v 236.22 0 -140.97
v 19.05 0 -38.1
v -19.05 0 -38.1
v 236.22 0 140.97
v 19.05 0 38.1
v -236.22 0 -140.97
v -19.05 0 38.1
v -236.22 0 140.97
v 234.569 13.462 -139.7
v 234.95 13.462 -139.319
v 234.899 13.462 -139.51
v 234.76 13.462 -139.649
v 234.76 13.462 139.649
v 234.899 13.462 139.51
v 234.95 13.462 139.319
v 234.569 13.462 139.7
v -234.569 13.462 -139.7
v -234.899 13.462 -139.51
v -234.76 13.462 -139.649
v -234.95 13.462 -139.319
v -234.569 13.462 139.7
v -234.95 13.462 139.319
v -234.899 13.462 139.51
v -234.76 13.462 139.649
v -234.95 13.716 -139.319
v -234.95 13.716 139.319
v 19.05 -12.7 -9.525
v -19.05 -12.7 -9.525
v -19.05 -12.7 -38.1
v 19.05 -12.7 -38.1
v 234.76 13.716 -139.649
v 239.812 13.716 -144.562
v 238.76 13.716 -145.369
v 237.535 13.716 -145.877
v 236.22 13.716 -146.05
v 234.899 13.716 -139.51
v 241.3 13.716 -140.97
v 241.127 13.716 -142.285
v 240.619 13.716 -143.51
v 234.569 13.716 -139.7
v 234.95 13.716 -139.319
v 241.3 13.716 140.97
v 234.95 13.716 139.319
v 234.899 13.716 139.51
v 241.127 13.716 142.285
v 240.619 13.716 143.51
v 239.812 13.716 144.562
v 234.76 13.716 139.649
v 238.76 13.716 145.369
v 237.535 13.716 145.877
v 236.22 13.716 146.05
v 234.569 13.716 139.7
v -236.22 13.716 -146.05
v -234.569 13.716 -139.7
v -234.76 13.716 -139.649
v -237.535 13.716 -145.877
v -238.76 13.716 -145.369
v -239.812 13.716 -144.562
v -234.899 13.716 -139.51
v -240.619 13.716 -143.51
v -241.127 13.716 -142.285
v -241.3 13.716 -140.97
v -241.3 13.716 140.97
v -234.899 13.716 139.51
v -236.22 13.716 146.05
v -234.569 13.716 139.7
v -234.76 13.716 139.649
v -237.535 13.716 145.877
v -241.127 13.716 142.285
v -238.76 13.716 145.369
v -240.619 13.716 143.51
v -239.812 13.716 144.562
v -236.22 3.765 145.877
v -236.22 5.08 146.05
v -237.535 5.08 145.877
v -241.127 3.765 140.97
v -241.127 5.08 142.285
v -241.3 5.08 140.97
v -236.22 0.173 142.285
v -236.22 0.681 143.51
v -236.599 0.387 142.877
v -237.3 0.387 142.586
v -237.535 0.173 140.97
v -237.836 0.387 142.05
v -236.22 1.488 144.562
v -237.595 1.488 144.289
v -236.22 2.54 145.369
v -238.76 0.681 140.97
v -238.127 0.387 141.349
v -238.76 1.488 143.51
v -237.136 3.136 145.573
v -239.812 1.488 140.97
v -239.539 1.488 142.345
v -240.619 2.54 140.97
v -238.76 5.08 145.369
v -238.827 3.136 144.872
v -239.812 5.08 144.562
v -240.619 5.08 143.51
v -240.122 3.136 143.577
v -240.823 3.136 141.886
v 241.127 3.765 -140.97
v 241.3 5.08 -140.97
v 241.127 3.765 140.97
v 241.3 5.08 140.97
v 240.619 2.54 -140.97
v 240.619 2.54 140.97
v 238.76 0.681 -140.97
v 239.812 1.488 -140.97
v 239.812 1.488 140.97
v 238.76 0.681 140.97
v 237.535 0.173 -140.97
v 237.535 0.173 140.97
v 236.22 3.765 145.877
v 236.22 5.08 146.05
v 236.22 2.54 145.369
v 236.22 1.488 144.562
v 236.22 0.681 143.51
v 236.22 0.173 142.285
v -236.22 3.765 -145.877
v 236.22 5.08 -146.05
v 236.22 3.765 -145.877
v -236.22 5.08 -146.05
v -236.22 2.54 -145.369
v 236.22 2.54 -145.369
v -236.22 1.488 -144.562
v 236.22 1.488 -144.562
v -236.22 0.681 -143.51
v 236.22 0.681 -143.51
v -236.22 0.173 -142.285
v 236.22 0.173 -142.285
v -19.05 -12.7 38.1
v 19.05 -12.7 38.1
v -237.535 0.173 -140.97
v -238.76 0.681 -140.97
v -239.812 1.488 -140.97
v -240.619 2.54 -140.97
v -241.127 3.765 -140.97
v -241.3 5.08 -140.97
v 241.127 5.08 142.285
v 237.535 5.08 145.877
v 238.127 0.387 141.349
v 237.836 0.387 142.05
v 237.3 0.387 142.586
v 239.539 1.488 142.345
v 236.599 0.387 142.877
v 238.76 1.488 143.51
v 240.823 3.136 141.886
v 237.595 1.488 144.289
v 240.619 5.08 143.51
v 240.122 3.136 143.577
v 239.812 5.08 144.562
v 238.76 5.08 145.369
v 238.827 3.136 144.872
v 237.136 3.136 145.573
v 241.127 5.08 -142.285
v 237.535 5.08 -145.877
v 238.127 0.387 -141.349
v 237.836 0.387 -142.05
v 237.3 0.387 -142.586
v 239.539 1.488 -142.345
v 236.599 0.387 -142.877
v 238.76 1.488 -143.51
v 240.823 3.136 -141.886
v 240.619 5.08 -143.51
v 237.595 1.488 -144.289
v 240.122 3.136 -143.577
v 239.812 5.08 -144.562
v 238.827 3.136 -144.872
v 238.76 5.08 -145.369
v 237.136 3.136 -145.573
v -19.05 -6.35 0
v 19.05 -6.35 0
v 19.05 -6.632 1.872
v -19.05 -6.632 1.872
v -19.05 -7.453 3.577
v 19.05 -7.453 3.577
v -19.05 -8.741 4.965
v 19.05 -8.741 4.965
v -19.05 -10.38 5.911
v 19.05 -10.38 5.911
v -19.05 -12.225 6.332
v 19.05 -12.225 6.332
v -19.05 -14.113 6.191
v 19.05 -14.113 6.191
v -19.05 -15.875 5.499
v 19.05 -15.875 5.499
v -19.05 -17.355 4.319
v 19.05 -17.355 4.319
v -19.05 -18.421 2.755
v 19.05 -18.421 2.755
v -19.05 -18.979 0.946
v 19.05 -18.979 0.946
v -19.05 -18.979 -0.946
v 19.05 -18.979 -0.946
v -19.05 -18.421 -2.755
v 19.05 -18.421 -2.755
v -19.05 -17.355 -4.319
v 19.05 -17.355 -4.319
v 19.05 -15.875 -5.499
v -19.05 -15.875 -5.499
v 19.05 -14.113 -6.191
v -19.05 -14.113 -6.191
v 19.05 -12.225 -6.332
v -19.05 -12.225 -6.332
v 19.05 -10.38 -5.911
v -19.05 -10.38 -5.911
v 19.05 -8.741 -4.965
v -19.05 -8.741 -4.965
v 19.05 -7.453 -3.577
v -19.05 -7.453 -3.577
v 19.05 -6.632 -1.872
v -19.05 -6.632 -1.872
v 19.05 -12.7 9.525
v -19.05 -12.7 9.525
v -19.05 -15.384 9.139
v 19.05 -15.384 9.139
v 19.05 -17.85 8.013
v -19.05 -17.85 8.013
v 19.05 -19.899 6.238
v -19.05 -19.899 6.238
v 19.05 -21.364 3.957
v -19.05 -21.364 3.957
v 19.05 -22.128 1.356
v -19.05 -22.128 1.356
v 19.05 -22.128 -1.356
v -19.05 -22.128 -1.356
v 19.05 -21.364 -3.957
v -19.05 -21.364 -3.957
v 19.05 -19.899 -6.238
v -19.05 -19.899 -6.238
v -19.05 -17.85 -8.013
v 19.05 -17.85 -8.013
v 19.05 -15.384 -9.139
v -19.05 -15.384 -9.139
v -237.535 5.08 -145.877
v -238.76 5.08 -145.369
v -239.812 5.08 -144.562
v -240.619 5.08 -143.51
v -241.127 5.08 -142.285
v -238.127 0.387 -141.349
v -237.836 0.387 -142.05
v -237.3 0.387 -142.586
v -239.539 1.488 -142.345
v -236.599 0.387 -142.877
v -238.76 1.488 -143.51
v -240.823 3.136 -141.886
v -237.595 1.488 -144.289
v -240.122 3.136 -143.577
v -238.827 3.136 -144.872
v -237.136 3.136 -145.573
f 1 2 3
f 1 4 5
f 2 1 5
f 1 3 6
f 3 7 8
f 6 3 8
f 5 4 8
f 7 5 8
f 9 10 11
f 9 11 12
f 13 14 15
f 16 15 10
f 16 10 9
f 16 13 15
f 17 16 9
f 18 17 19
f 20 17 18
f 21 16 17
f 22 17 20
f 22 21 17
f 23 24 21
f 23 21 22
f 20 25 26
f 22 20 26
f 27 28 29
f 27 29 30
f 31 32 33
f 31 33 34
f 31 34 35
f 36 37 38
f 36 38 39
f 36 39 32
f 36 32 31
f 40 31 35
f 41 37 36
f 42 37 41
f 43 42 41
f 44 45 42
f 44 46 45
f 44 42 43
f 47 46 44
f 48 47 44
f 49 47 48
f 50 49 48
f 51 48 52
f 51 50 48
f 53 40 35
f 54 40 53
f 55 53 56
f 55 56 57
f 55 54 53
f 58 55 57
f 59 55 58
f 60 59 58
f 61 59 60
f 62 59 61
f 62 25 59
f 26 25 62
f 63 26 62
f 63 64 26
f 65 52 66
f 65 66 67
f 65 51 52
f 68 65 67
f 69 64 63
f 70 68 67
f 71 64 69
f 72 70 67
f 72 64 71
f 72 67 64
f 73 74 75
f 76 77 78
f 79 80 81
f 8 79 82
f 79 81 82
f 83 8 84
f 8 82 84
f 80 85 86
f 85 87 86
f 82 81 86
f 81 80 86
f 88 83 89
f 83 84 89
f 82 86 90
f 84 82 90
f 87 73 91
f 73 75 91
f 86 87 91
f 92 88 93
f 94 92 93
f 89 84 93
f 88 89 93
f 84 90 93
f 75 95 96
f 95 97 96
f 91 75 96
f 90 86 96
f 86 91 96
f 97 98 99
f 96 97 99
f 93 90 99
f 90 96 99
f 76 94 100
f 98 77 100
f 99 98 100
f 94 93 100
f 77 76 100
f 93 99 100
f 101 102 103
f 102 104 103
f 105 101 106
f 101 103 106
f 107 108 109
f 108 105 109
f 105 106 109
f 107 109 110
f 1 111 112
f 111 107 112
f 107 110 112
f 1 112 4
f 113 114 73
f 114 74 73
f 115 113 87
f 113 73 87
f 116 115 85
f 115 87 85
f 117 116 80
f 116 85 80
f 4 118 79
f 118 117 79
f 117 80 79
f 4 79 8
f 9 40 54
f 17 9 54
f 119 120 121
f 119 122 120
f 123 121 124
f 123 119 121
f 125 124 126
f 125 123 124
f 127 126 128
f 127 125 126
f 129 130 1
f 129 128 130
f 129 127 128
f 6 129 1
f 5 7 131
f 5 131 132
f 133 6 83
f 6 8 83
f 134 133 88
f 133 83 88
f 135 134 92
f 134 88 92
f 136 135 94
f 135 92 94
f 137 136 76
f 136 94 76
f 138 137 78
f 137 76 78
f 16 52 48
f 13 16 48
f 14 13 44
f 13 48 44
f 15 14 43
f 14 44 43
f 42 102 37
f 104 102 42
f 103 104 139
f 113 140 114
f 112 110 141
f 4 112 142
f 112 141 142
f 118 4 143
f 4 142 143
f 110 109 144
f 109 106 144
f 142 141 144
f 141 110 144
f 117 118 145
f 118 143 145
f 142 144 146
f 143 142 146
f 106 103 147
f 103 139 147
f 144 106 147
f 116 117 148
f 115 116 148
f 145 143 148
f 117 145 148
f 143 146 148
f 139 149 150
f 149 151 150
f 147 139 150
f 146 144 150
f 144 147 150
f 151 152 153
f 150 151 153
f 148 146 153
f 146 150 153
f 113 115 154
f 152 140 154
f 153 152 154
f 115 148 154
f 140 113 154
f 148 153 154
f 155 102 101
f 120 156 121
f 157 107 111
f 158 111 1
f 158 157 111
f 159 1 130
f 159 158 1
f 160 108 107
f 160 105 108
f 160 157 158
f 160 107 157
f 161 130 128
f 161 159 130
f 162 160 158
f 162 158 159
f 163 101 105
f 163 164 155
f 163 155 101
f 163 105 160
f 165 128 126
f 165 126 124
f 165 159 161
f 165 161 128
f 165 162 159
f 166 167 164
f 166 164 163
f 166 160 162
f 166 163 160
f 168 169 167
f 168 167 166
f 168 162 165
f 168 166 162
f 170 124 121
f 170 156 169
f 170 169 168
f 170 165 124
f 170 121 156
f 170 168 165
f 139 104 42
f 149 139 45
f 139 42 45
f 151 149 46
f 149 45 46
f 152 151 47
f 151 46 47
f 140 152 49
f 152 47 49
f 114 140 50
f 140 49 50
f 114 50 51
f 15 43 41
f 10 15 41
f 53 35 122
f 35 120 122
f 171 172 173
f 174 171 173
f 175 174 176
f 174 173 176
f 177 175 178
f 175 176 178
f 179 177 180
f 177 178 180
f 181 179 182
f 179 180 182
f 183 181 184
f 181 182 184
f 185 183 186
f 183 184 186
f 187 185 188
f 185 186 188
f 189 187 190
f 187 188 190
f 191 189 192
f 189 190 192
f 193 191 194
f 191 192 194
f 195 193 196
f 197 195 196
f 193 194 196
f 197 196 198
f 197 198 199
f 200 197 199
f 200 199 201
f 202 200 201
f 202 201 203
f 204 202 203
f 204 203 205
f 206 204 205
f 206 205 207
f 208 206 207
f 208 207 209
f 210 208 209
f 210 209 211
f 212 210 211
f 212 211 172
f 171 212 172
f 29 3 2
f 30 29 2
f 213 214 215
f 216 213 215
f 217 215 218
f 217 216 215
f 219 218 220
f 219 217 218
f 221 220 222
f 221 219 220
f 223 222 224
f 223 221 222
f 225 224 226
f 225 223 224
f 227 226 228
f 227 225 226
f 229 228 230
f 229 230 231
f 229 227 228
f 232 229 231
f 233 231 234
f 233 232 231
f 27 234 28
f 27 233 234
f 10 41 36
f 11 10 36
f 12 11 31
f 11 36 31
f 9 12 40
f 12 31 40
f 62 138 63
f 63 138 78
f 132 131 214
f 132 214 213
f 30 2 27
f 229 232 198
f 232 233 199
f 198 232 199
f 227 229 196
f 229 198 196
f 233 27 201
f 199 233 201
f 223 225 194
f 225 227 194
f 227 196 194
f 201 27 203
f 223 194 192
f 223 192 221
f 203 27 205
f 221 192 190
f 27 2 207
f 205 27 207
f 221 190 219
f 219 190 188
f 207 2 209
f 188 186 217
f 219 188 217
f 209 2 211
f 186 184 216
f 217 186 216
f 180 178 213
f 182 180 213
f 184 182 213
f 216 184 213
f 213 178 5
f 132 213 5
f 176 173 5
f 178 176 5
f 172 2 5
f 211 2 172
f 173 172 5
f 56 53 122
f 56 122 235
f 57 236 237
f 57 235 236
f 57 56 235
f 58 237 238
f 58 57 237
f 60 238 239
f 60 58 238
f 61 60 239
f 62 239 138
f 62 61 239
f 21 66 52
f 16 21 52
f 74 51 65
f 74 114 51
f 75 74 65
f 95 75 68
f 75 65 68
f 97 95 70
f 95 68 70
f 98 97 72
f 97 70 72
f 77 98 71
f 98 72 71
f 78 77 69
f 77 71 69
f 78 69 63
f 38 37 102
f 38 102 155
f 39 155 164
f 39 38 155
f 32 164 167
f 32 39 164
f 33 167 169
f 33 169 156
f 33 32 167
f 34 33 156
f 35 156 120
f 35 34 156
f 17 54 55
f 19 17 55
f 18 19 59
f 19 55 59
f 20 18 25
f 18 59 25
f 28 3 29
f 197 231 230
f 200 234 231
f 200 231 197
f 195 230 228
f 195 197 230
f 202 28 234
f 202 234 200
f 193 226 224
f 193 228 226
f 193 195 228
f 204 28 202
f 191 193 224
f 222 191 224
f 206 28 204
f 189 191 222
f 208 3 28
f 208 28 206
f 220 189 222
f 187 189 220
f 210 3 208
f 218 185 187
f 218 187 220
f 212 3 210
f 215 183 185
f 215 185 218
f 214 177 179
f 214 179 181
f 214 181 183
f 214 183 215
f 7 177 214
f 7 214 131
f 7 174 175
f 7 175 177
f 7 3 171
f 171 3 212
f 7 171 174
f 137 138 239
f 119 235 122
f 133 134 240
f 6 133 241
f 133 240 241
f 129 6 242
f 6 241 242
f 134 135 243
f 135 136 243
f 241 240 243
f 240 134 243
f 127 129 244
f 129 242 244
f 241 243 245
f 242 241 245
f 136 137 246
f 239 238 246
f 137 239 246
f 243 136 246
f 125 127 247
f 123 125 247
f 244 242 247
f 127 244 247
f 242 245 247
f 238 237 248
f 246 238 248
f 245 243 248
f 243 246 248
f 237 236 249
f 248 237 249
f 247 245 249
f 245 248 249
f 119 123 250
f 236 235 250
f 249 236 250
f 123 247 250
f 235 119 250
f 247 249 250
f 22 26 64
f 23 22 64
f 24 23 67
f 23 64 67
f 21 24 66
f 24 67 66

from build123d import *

# Parameters (mm, degrees)
F0_W      = 38.1
F0_H      = 76.2
F1_DEPTH  = 12.7
F2_R      = 9.525
F3_DEPTH  = 38.1
F4_R      = 6.35
F5_DEPTH  = 40.386
F6_W      = 482.6
F6_H      = 292.1
F7_DEPTH  = 13.716
F8_R      = 5.08
F10_DEPTH = 0.254


with BuildPart() as f1:
    # F0 (on Front) → F1 (new body)
    with BuildSketch(Plane.XZ):
        Rectangle(F0_W, F0_H)
    extrude(amount=F1_DEPTH)

    # F2 (on face) → F3 (join)
    with BuildSketch(Plane.YZ.offset(19.05)):
        with Locations((-12.7, 0)):
            Circle(F2_R)
    extrude(amount=-F3_DEPTH)

    # F4 (on face) → F5 (cut)
    with BuildSketch(Plane.YZ.offset(19.05)):
        with Locations((-12.7, 0)):
            Circle(F4_R)
    extrude(amount=-F5_DEPTH, mode=Mode.SUBTRACT)

    # F6 (on face) → F7 (join)
    with BuildSketch(Plane(origin=(0, 0, 0), x_dir=(-1, 0, 0), z_dir=(0, 1, 0))):
        Rectangle(F6_W, F6_H)
    extrude(amount=F7_DEPTH)

    # F8
    f8_edges = [f1.edges().sort_by_distance(p)[0] for p in [
        (-241.3, 6.858, 146.05),
        (-241.3, 6.858, -146.05),
        (241.3, 6.858, -146.05),
        (241.3, 6.858, 146.05),
        (241.3, 0, 0),
        (0, 0, 146.05),
        (-241.3, 0, 0),
        (0, 0, -146.05),
    ]]
    fillet(f8_edges, radius=F8_R)

    # F9 (on face) → F10 (cut)
    with BuildSketch(Plane(origin=(0, 13.716, 0), x_dir=(-1, 0, 0), z_dir=(0, 1, 0))):
        with BuildLine():
            Line((-234.569, -139.7), (234.569, -139.7))
            ThreePointArc((234.569, -139.7), (234.838408, -139.588408), (234.95, -139.319))
            Line((234.95, -139.319), (234.95, 139.319))
            ThreePointArc((234.95, 139.319), (234.838408, 139.588408), (234.569, 139.7))
            Line((234.569, 139.7), (-234.569, 139.7))
            ThreePointArc((-234.569, 139.7), (-234.838408, 139.588408), (-234.95, 139.319))
            Line((-234.95, 139.319), (-234.95, -139.319))
            ThreePointArc((-234.95, -139.319), (-234.838408, -139.588408), (-234.569, -139.7))
        make_face()
    extrude(amount=-F10_DEPTH, mode=Mode.SUBTRACT)


solid = f1.part
